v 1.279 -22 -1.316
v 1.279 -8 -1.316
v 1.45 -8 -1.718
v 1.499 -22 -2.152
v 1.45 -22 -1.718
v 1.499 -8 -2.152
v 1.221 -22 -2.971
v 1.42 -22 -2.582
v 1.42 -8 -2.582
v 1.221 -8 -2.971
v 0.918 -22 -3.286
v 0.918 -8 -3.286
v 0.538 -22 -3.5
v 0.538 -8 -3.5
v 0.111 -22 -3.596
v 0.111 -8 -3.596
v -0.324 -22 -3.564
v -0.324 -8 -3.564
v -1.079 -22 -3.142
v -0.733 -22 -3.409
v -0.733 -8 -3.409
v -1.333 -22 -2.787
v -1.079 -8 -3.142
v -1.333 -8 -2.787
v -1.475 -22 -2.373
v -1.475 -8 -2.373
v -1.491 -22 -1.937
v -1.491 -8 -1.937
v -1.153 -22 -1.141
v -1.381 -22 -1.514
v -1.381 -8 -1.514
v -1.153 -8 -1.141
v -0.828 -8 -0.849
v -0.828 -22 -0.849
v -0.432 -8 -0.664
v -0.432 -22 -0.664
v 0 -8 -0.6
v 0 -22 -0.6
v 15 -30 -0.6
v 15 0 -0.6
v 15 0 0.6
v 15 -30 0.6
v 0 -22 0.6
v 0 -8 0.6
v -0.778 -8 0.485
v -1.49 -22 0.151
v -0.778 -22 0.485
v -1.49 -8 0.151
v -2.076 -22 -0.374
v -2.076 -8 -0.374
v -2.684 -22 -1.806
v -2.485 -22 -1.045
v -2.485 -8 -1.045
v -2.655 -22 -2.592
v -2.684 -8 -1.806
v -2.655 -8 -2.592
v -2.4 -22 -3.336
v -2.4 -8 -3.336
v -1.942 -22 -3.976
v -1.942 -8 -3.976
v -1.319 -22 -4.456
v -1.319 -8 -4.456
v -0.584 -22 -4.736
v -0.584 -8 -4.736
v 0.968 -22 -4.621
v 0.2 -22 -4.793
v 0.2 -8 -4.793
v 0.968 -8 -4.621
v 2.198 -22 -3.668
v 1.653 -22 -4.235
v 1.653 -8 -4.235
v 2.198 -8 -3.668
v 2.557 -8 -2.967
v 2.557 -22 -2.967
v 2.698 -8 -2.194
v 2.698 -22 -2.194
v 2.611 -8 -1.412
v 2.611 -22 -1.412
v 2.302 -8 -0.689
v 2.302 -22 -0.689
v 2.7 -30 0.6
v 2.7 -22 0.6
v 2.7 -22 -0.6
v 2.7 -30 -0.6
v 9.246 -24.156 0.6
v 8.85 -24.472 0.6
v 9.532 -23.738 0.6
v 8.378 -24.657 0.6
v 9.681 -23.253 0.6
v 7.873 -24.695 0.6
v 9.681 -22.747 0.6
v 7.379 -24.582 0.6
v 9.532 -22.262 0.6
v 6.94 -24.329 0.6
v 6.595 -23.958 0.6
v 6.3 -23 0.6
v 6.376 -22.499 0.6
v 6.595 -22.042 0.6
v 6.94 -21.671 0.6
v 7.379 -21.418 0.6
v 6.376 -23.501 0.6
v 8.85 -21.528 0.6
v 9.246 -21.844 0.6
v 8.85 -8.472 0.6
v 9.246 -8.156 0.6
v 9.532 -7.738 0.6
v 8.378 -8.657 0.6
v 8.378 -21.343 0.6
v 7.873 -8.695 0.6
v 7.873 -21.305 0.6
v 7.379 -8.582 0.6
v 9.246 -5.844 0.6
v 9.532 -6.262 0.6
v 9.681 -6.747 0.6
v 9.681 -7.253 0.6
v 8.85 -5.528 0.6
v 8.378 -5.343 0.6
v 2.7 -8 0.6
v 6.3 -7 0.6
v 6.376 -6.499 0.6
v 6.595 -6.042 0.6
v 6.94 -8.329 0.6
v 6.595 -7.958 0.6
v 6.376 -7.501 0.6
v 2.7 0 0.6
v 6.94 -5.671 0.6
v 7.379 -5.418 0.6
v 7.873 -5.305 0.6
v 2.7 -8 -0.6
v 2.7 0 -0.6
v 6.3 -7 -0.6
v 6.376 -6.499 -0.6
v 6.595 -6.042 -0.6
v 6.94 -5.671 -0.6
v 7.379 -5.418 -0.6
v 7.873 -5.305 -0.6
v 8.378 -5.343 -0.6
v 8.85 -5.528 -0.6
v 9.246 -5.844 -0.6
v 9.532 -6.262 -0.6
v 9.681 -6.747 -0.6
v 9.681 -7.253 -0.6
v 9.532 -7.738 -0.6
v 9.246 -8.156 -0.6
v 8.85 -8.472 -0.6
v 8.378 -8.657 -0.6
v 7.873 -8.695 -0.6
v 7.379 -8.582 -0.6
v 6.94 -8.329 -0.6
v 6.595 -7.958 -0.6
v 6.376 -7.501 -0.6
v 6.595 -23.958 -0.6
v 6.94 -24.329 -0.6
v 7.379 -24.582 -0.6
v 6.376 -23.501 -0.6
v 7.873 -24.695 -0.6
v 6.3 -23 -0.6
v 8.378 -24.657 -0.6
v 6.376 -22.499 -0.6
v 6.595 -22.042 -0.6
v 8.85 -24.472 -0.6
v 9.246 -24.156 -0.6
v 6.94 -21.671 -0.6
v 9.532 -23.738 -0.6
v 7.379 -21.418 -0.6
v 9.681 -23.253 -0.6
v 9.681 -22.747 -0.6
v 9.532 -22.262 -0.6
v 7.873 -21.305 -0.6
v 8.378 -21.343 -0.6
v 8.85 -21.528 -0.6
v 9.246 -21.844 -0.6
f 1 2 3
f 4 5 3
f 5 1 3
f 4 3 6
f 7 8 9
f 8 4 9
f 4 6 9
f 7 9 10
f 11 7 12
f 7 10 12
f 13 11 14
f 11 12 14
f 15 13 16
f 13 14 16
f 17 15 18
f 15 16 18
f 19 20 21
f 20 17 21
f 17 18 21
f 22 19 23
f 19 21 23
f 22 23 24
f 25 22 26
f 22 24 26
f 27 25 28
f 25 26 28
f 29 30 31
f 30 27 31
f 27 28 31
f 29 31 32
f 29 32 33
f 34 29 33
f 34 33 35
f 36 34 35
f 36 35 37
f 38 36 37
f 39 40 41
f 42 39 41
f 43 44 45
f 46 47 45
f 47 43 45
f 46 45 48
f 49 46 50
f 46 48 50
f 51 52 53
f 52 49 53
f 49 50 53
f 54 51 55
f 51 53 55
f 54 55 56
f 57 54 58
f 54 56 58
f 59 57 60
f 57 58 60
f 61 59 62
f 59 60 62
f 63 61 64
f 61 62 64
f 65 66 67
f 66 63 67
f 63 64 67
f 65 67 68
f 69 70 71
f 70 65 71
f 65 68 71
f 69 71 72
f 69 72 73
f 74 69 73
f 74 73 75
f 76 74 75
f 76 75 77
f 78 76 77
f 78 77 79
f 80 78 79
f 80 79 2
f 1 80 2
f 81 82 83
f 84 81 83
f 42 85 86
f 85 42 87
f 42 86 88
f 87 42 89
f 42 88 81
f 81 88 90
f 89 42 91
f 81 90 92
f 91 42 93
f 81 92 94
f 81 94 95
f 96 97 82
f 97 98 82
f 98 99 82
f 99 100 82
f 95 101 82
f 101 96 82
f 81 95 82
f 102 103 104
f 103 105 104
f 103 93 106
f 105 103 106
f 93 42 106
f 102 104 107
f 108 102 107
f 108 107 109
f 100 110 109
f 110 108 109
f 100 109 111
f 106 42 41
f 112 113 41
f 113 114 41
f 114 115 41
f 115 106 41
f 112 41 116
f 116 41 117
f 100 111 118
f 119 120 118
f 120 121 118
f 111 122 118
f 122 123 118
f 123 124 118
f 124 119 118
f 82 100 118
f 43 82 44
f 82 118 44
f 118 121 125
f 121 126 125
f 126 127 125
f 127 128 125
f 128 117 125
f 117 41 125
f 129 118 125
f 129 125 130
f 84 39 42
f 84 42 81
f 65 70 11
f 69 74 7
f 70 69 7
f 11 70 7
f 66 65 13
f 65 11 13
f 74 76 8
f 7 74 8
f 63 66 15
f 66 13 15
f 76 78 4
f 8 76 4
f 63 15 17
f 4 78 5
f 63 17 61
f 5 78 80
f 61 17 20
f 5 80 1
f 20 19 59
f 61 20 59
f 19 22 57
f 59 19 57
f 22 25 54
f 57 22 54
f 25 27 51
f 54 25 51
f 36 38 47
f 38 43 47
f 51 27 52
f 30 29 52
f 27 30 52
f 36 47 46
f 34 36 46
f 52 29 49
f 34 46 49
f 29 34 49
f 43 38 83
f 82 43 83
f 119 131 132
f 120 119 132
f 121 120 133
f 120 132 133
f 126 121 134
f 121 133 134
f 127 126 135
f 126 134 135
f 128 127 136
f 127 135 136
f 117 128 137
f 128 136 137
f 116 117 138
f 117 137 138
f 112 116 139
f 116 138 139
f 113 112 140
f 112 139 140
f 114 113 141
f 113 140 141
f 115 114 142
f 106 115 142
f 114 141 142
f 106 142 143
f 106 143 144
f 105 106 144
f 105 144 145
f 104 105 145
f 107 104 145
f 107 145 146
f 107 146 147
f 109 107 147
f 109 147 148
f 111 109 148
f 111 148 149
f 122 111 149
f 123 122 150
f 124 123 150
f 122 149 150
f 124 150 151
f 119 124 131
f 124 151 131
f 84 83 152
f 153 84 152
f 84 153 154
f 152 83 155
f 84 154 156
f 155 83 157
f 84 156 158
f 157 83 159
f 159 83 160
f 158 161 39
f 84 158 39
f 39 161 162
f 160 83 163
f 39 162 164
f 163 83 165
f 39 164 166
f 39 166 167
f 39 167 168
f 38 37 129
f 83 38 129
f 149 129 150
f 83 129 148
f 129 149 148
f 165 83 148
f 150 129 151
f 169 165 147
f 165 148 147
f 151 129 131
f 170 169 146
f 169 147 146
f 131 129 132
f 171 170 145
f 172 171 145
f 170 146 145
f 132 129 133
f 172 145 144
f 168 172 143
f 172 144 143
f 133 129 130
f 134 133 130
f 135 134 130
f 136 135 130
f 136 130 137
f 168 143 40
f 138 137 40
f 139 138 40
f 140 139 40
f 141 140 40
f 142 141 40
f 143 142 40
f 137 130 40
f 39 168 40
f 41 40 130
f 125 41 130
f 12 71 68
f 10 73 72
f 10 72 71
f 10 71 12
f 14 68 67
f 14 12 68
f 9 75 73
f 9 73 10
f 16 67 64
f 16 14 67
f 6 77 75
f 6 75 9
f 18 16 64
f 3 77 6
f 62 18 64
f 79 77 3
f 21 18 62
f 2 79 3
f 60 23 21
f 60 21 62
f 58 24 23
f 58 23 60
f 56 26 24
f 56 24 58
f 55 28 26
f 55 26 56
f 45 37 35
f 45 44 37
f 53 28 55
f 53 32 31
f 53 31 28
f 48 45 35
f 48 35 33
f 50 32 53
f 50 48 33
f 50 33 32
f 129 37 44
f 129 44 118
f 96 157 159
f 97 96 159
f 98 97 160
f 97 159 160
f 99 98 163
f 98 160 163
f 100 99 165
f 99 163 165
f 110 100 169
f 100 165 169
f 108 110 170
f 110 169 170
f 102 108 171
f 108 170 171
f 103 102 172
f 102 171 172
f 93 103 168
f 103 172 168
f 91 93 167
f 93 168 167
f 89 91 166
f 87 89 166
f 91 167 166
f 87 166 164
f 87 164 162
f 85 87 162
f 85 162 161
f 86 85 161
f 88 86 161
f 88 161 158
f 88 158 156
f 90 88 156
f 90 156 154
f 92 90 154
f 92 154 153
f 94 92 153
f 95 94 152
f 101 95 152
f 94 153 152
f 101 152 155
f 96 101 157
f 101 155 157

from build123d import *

# Parameters (mm, degrees)
Y_KSEKLIK_EKSTR_ZYON1_DEPTH = 30
KES_EKSTR_ZYON2_START       = -8
KES_EKSTR_ZYON2_DEPTH       = 8
IZIM4_R                     = 1.7
KES_EKSTR_ZYON3_DEPTH       = 1.2


with BuildPart() as part:
    # Çizim1 → Yükseklik-Ekstrüzyon1 (new body)
    with BuildSketch(Plane(origin=(0, 0, 0), x_dir=(1, 0, 0), z_dir=(0, 1, 0))):
        with BuildLine():
            Line((0, 0.6), (15, 0.6))
            Line((15, 0.6), (15, -0.6))
            Line((15, -0.6), (0, -0.6))
            ThreePointArc((0, -0.6), (-1.319038138, 4.455873169), (2.301841896, 0.688786378))
            Line((2.301841896, 0.688786378), (1.278801053, 1.315992432))
            ThreePointArc((1.278801053, 1.315992432), (-0.732798966, 3.408818427), (0, 0.6))
        make_face()
    extrude(amount=-Y_KSEKLIK_EKSTR_ZYON1_DEPTH)

    # Çizim3 → Kes-Ekstrüzyon2 (cut)
    with BuildSketch(Plane.XZ.offset(30).offset(KES_EKSTR_ZYON2_START)):
        with BuildLine():
            Line((1.278801053, -1.315992432), (2.301841896, -0.688786378))
            ThreePointArc((2.301841896, -0.688786378), (-1.319038138, -4.455873169), (0, 0.6))
            Line((0, 0.6), (2.7, 0.6))
            Line((2.7, 0.6), (2.7, -0.6))
            Line((2.7, -0.6), (0, -0.6))
            ThreePointArc((0, -0.6), (-0.732798966, -3.408818427), (1.278801053, -1.315992432))
        make_face()
    kes_ekstr_zyon2 = extrude(amount=KES_EKSTR_ZYON2_DEPTH, mode=Mode.SUBTRACT)

    # Çizim4 → Kes-Ekstrüzyon3 (cut)
    with BuildSketch(Plane(origin=(0, 0, -0.6), x_dir=(-1, 0, 0), z_dir=(0, 0, -1))):
        with Locations((-8, -23)):
            Circle(IZIM4_R)
        with Locations((-8, -7)):
            Circle(IZIM4_R)
    extrude(amount=-KES_EKSTR_ZYON3_DEPTH, mode=Mode.SUBTRACT)

    # Aynalama1: Kes-Ekstrüzyon2 across plane
    add(kes_ekstr_zyon2.mirror(Plane(origin=(0, -15, 0), x_dir=(0, 0, 1), z_dir=(0, -1, 0))), mode=Mode.SUBTRACT)


solid = part.part
